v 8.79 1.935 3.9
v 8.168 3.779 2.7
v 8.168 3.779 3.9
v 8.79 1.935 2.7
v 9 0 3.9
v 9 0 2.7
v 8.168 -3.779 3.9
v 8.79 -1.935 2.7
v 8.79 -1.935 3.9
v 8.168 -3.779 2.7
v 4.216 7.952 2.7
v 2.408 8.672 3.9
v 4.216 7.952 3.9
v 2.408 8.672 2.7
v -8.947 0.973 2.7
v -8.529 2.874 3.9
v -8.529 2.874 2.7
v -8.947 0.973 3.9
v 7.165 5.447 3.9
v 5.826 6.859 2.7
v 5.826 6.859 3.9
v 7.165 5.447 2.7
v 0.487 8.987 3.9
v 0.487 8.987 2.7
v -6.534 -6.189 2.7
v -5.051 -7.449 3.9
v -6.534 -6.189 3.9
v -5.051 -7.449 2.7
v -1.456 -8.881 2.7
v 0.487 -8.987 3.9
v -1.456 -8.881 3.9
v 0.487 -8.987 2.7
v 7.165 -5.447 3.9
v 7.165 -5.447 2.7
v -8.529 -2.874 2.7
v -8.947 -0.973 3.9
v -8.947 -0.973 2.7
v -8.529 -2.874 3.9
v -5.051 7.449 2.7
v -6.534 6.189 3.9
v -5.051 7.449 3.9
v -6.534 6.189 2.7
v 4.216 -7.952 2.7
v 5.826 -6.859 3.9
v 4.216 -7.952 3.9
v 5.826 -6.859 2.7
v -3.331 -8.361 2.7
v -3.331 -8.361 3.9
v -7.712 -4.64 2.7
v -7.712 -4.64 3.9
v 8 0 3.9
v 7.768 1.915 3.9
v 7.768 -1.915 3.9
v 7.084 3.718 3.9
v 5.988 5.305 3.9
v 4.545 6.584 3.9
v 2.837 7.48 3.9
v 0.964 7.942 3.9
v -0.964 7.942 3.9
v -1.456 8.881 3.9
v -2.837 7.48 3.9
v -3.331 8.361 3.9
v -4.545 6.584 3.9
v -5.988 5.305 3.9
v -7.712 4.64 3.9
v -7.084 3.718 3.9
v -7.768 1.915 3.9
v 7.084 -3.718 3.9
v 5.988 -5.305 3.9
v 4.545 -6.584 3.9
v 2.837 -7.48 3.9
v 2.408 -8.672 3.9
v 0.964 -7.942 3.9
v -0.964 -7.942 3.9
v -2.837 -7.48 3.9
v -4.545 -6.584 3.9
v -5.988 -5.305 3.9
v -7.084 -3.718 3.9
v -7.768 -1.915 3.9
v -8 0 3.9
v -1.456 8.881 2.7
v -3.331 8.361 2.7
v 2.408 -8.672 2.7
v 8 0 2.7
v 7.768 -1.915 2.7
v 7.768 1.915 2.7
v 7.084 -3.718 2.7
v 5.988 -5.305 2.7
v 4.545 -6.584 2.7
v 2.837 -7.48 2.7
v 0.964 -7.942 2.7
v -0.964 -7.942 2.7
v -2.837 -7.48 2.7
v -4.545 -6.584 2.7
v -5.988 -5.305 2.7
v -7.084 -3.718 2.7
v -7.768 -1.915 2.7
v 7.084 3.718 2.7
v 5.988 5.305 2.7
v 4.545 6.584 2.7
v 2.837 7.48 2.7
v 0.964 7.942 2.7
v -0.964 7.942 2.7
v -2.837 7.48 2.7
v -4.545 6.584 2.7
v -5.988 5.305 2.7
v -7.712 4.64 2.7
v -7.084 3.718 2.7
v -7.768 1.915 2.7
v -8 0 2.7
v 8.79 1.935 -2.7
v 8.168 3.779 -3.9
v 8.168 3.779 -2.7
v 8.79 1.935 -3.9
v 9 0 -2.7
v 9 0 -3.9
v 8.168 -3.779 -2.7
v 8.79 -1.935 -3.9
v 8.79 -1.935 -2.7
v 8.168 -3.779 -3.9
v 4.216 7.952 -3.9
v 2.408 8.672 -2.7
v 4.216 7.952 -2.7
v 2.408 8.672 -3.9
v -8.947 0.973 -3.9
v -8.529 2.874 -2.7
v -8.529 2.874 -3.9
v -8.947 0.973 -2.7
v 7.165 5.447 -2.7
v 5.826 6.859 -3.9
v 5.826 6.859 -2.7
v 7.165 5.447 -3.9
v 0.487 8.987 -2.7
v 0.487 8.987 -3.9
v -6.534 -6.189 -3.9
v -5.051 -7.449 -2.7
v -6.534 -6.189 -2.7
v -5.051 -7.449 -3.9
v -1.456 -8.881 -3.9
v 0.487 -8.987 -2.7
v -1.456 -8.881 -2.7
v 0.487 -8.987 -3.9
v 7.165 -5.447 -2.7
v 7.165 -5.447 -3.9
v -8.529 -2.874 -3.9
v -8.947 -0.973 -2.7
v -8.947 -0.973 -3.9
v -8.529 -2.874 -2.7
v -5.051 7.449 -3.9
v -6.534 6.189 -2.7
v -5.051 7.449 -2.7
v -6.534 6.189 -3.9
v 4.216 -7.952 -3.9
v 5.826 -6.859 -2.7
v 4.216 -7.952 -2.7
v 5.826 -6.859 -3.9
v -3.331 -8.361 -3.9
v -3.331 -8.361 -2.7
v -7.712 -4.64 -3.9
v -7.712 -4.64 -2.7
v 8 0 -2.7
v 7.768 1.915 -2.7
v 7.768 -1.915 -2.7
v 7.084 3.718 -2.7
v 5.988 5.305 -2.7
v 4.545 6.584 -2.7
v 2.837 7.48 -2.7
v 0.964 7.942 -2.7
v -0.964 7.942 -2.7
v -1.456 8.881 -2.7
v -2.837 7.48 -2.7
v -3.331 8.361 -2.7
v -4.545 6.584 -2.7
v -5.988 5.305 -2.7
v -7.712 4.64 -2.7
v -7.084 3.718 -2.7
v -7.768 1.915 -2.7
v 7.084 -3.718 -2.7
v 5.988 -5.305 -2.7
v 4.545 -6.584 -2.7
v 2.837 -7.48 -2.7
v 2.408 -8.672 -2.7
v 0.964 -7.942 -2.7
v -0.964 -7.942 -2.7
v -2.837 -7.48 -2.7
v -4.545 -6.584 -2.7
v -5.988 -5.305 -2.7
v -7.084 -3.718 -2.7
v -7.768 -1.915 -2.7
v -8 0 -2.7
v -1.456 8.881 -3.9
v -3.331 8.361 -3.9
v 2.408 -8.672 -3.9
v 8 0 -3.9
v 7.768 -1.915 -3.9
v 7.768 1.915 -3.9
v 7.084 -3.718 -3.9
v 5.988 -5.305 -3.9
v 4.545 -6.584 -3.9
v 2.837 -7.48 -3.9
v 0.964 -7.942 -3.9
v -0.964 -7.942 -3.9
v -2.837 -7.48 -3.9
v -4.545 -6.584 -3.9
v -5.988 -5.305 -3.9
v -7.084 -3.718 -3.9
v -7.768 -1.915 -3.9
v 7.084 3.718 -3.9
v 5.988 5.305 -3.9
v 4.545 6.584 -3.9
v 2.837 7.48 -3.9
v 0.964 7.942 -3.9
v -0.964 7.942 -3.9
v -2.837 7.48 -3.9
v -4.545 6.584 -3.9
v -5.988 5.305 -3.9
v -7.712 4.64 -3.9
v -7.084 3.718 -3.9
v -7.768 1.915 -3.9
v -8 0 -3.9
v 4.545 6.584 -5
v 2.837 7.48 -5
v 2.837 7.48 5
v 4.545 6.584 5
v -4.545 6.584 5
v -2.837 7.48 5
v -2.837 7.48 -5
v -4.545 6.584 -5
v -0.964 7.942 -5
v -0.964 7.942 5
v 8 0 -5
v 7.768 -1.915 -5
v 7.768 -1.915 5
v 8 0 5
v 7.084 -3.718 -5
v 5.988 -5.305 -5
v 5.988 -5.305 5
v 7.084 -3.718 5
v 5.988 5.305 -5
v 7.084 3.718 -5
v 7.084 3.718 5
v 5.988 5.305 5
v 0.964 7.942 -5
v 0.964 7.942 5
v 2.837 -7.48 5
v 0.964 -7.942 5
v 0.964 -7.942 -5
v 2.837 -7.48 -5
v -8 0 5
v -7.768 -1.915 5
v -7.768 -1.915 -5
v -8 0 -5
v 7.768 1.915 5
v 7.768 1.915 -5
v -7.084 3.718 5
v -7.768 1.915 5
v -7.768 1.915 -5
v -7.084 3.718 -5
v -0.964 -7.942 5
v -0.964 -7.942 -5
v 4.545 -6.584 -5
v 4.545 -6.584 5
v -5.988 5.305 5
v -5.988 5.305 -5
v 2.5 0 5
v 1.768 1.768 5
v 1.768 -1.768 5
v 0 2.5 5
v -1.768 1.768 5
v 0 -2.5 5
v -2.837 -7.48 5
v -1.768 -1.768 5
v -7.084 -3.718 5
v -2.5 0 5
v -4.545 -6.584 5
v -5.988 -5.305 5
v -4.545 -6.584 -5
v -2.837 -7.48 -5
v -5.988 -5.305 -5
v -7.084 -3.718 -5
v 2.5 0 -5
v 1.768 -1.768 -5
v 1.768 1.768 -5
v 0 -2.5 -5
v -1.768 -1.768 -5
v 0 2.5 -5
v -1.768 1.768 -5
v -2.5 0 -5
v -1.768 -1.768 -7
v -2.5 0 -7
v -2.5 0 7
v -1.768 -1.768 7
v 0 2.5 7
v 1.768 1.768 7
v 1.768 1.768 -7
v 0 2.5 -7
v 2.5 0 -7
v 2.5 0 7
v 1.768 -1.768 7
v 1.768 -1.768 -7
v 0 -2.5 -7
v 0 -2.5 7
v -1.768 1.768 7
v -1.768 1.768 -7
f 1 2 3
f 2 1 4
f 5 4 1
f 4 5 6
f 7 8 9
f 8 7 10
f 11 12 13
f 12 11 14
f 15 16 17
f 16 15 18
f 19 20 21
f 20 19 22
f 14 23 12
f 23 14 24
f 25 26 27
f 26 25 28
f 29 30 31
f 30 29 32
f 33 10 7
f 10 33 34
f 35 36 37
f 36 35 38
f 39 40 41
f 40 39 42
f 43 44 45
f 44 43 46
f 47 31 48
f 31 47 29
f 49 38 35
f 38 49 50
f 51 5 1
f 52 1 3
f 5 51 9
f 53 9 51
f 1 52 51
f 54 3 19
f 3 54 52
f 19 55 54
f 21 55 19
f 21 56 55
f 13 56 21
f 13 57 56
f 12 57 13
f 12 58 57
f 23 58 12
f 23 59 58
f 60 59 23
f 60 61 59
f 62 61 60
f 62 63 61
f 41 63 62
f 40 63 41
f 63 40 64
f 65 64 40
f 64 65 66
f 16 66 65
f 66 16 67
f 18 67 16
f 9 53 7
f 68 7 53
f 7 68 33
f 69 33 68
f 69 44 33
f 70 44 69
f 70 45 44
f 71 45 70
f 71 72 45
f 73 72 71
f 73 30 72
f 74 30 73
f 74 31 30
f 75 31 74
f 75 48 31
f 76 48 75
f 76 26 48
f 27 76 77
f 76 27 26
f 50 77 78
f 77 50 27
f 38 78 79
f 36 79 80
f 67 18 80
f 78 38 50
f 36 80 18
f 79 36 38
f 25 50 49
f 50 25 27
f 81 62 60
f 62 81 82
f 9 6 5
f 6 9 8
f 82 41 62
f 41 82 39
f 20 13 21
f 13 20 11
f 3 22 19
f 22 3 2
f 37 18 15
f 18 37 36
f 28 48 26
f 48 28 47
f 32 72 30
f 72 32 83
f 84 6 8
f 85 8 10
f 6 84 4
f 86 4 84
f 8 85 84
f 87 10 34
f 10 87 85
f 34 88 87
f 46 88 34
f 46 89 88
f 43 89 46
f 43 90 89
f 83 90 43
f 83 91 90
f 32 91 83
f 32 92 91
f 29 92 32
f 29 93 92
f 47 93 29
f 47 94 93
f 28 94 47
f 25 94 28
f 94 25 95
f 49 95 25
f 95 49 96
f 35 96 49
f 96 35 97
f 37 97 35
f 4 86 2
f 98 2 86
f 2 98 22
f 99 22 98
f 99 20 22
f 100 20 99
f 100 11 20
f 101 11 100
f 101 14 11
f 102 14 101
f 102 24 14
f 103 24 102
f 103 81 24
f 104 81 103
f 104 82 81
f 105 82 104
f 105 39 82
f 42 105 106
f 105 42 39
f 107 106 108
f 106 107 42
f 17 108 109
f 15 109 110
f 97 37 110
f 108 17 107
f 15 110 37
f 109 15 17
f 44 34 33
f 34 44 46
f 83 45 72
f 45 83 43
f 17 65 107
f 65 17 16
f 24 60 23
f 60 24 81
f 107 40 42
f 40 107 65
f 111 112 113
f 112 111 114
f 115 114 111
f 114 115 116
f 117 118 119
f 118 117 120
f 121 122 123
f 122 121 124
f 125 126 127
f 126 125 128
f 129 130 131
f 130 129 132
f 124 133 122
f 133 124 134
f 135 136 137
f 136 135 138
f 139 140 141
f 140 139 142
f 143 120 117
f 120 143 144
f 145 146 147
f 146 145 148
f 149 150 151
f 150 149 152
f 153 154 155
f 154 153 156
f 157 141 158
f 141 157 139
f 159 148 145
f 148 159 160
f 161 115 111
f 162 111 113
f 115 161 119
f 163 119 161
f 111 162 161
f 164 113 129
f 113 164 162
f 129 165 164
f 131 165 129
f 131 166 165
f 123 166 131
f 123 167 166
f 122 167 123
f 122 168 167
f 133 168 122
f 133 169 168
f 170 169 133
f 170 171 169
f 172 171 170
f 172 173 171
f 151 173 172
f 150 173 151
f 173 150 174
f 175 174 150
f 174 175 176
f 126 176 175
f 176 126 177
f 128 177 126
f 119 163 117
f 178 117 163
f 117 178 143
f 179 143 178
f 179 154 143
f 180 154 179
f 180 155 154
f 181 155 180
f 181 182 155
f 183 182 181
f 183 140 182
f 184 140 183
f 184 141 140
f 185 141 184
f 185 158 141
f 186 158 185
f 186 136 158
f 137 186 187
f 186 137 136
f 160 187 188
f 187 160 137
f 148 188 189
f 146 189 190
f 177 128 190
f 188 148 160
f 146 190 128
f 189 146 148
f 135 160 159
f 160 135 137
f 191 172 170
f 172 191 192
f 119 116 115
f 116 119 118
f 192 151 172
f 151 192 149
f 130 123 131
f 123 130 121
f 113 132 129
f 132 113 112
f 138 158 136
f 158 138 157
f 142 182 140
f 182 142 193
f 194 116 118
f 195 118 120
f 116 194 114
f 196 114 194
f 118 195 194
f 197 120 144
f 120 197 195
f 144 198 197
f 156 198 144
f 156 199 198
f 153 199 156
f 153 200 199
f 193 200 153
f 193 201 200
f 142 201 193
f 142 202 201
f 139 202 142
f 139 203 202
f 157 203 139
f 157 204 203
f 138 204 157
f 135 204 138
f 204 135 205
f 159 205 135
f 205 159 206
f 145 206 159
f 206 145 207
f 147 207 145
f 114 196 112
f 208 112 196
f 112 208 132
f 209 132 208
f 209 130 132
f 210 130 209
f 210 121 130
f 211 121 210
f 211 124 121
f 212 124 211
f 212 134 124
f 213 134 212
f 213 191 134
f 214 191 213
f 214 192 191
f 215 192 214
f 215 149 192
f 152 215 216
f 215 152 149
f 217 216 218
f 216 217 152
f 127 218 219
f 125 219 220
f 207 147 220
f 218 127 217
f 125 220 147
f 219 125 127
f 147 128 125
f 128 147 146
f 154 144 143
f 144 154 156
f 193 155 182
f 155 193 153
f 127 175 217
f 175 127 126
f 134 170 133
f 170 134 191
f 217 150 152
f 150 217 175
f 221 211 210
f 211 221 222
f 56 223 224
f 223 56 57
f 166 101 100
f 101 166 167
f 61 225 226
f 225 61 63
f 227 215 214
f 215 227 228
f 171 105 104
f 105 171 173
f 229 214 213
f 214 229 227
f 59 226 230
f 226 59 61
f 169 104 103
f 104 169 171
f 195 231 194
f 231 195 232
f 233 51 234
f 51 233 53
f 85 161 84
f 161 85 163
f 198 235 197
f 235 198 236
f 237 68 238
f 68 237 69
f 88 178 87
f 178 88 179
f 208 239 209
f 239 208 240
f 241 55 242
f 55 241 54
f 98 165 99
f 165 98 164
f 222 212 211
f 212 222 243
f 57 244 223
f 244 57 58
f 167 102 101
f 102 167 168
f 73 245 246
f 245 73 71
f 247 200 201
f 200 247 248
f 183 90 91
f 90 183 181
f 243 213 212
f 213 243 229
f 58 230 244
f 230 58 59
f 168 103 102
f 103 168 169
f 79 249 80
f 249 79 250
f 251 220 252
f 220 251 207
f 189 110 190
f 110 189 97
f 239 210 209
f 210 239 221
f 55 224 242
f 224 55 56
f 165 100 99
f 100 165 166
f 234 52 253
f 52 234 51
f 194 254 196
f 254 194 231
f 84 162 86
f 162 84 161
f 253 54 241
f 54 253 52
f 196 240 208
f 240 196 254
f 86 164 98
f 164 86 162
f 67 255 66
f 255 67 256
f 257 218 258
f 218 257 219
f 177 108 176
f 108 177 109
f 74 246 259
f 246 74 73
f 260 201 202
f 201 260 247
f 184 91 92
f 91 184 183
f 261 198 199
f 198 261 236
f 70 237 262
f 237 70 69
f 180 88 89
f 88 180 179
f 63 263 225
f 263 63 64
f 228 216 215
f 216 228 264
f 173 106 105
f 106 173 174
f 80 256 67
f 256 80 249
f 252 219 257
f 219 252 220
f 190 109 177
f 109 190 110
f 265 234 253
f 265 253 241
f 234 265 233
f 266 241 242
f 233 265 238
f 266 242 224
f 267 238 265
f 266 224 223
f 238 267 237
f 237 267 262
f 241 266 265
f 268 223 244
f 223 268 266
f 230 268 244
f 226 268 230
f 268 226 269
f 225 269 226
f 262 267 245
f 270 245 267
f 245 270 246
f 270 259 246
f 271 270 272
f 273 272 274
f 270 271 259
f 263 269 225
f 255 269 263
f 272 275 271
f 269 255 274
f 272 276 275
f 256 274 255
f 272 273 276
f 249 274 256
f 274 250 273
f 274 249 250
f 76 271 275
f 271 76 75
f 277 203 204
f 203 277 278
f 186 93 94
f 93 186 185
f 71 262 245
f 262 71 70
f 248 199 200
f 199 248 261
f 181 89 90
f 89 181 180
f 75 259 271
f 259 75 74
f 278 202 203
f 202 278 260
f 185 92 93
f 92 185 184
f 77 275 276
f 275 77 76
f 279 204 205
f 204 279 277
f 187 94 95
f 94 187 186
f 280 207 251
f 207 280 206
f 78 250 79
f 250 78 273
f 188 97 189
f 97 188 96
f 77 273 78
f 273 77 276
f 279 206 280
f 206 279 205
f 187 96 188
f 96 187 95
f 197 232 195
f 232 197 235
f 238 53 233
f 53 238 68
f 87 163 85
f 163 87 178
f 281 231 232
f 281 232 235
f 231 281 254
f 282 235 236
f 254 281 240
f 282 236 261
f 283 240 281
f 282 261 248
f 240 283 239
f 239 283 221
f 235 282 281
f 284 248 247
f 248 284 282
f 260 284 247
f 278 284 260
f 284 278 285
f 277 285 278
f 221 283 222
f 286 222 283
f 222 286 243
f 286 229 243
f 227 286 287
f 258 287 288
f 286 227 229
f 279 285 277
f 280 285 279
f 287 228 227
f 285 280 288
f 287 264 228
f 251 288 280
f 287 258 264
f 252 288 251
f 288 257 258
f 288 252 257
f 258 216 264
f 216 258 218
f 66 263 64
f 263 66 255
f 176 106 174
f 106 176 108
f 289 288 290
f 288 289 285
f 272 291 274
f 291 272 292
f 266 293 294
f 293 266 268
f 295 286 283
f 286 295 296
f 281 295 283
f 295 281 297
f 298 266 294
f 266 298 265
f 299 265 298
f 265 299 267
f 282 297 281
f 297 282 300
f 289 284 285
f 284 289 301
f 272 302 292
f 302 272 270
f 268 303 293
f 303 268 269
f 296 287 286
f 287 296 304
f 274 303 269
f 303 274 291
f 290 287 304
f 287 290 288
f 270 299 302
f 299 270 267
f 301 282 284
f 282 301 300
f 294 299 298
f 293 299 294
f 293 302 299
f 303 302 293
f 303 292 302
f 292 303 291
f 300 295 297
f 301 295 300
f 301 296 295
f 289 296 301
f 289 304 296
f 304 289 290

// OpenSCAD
// Parameters
tooth_count = 20; //[10:60:1]
pitch_diameter_mm = 12.22; //[6.11:24.44:0.01]
pitch_radius_mm = 6.11; //[3.055:12.22:0.01]
pulley_width_mm = 7; //[4:20:0.1]
tooth_radial_height_mm = 1.2; //[0.6:2.4:0.05]
tooth_root_clearance_mm = 0.6; //[0.3:1.2:0.05]
tooth_tangential_width_factor = 0.55; //[0.35:0.75:0.01]
tooth_overlap_mm = 0.8; //[0.3:2:0.05]
bore_diameter_mm = 5; //[2:10:0.1]
hub_diameter_mm = 16; //[10:32:0.1]
hub_length_mm = 10; //[5:25:0.1]
flange_enabled = 1; //[0:1:1]
flange_diameter_mm = 18; //[12:40:0.1]
flange_thickness_mm = 1.2; //[0:4:0.1]
overlap_mm = 0.8; //[0.3:2:0.1]

// Pulley - complete geometry
module pulley() {
  color("Silver") {
    // Toothed pulley body
    cylinder(r=pitch_radius_mm - tooth_root_clearance_mm, h=pulley_width_mm, center=true);

    // Hub
    translate([0, 0, 0])
      cylinder(r=hub_diameter_mm/2, h=hub_length_mm, center=true);

    // Flanges
    if (flange_enabled) {
      translate([0, 0, pulley_width_mm/2 + flange_thickness_mm/2 - overlap_mm])
        cylinder(r=flange_diameter_mm/2, h=flange_thickness_mm, center=true);
      translate([0, 0, -pulley_width_mm/2 - flange_thickness_mm/2 + overlap_mm])
        cylinder(r=flange_diameter_mm/2, h=flange_thickness_mm, center=true);
    }

    // Central bore
    translate([0, 0, 0])
      cylinder(r=bore_diameter_mm/2, h=hub_length_mm + 2*flange_thickness_mm + 2*overlap_mm, center=true);
  }
}

// Printed Pulley Teeth - complete geometry
module printed_pulley_teeth() {
  color("DimGray") {
    for (i = [0:tooth_count-1]) {
      rotate([0, 0, i*360/tooth_count])
        translate([pitch_radius_mm + (tooth_radial_height_mm + tooth_overlap_mm)/2 - tooth_overlap_mm, 0, 0])
        cube([tooth_radial_height_mm + tooth_overlap_mm, (PI*pitch_diameter_mm/tooth_count) * tooth_tangential_width_factor, pulley_width_mm], center=true);
    }
  }
}

// Printed Pulley Teeth From Profile - complete geometry
module printed_pulley_teeth_from_profile() {
  color("DimGray") {
    printed_pulley_teeth();
  }
}

// Printed Pulley GT2 Teeth - complete geometry
module printed_pulley_GT2_teeth() {
  color("DimGray") {
    printed_pulley_teeth_from_profile();
  }
}

// Assembly
module assembly() {
  pulley();
  printed_pulley_GT2_teeth();
}

assembly();
